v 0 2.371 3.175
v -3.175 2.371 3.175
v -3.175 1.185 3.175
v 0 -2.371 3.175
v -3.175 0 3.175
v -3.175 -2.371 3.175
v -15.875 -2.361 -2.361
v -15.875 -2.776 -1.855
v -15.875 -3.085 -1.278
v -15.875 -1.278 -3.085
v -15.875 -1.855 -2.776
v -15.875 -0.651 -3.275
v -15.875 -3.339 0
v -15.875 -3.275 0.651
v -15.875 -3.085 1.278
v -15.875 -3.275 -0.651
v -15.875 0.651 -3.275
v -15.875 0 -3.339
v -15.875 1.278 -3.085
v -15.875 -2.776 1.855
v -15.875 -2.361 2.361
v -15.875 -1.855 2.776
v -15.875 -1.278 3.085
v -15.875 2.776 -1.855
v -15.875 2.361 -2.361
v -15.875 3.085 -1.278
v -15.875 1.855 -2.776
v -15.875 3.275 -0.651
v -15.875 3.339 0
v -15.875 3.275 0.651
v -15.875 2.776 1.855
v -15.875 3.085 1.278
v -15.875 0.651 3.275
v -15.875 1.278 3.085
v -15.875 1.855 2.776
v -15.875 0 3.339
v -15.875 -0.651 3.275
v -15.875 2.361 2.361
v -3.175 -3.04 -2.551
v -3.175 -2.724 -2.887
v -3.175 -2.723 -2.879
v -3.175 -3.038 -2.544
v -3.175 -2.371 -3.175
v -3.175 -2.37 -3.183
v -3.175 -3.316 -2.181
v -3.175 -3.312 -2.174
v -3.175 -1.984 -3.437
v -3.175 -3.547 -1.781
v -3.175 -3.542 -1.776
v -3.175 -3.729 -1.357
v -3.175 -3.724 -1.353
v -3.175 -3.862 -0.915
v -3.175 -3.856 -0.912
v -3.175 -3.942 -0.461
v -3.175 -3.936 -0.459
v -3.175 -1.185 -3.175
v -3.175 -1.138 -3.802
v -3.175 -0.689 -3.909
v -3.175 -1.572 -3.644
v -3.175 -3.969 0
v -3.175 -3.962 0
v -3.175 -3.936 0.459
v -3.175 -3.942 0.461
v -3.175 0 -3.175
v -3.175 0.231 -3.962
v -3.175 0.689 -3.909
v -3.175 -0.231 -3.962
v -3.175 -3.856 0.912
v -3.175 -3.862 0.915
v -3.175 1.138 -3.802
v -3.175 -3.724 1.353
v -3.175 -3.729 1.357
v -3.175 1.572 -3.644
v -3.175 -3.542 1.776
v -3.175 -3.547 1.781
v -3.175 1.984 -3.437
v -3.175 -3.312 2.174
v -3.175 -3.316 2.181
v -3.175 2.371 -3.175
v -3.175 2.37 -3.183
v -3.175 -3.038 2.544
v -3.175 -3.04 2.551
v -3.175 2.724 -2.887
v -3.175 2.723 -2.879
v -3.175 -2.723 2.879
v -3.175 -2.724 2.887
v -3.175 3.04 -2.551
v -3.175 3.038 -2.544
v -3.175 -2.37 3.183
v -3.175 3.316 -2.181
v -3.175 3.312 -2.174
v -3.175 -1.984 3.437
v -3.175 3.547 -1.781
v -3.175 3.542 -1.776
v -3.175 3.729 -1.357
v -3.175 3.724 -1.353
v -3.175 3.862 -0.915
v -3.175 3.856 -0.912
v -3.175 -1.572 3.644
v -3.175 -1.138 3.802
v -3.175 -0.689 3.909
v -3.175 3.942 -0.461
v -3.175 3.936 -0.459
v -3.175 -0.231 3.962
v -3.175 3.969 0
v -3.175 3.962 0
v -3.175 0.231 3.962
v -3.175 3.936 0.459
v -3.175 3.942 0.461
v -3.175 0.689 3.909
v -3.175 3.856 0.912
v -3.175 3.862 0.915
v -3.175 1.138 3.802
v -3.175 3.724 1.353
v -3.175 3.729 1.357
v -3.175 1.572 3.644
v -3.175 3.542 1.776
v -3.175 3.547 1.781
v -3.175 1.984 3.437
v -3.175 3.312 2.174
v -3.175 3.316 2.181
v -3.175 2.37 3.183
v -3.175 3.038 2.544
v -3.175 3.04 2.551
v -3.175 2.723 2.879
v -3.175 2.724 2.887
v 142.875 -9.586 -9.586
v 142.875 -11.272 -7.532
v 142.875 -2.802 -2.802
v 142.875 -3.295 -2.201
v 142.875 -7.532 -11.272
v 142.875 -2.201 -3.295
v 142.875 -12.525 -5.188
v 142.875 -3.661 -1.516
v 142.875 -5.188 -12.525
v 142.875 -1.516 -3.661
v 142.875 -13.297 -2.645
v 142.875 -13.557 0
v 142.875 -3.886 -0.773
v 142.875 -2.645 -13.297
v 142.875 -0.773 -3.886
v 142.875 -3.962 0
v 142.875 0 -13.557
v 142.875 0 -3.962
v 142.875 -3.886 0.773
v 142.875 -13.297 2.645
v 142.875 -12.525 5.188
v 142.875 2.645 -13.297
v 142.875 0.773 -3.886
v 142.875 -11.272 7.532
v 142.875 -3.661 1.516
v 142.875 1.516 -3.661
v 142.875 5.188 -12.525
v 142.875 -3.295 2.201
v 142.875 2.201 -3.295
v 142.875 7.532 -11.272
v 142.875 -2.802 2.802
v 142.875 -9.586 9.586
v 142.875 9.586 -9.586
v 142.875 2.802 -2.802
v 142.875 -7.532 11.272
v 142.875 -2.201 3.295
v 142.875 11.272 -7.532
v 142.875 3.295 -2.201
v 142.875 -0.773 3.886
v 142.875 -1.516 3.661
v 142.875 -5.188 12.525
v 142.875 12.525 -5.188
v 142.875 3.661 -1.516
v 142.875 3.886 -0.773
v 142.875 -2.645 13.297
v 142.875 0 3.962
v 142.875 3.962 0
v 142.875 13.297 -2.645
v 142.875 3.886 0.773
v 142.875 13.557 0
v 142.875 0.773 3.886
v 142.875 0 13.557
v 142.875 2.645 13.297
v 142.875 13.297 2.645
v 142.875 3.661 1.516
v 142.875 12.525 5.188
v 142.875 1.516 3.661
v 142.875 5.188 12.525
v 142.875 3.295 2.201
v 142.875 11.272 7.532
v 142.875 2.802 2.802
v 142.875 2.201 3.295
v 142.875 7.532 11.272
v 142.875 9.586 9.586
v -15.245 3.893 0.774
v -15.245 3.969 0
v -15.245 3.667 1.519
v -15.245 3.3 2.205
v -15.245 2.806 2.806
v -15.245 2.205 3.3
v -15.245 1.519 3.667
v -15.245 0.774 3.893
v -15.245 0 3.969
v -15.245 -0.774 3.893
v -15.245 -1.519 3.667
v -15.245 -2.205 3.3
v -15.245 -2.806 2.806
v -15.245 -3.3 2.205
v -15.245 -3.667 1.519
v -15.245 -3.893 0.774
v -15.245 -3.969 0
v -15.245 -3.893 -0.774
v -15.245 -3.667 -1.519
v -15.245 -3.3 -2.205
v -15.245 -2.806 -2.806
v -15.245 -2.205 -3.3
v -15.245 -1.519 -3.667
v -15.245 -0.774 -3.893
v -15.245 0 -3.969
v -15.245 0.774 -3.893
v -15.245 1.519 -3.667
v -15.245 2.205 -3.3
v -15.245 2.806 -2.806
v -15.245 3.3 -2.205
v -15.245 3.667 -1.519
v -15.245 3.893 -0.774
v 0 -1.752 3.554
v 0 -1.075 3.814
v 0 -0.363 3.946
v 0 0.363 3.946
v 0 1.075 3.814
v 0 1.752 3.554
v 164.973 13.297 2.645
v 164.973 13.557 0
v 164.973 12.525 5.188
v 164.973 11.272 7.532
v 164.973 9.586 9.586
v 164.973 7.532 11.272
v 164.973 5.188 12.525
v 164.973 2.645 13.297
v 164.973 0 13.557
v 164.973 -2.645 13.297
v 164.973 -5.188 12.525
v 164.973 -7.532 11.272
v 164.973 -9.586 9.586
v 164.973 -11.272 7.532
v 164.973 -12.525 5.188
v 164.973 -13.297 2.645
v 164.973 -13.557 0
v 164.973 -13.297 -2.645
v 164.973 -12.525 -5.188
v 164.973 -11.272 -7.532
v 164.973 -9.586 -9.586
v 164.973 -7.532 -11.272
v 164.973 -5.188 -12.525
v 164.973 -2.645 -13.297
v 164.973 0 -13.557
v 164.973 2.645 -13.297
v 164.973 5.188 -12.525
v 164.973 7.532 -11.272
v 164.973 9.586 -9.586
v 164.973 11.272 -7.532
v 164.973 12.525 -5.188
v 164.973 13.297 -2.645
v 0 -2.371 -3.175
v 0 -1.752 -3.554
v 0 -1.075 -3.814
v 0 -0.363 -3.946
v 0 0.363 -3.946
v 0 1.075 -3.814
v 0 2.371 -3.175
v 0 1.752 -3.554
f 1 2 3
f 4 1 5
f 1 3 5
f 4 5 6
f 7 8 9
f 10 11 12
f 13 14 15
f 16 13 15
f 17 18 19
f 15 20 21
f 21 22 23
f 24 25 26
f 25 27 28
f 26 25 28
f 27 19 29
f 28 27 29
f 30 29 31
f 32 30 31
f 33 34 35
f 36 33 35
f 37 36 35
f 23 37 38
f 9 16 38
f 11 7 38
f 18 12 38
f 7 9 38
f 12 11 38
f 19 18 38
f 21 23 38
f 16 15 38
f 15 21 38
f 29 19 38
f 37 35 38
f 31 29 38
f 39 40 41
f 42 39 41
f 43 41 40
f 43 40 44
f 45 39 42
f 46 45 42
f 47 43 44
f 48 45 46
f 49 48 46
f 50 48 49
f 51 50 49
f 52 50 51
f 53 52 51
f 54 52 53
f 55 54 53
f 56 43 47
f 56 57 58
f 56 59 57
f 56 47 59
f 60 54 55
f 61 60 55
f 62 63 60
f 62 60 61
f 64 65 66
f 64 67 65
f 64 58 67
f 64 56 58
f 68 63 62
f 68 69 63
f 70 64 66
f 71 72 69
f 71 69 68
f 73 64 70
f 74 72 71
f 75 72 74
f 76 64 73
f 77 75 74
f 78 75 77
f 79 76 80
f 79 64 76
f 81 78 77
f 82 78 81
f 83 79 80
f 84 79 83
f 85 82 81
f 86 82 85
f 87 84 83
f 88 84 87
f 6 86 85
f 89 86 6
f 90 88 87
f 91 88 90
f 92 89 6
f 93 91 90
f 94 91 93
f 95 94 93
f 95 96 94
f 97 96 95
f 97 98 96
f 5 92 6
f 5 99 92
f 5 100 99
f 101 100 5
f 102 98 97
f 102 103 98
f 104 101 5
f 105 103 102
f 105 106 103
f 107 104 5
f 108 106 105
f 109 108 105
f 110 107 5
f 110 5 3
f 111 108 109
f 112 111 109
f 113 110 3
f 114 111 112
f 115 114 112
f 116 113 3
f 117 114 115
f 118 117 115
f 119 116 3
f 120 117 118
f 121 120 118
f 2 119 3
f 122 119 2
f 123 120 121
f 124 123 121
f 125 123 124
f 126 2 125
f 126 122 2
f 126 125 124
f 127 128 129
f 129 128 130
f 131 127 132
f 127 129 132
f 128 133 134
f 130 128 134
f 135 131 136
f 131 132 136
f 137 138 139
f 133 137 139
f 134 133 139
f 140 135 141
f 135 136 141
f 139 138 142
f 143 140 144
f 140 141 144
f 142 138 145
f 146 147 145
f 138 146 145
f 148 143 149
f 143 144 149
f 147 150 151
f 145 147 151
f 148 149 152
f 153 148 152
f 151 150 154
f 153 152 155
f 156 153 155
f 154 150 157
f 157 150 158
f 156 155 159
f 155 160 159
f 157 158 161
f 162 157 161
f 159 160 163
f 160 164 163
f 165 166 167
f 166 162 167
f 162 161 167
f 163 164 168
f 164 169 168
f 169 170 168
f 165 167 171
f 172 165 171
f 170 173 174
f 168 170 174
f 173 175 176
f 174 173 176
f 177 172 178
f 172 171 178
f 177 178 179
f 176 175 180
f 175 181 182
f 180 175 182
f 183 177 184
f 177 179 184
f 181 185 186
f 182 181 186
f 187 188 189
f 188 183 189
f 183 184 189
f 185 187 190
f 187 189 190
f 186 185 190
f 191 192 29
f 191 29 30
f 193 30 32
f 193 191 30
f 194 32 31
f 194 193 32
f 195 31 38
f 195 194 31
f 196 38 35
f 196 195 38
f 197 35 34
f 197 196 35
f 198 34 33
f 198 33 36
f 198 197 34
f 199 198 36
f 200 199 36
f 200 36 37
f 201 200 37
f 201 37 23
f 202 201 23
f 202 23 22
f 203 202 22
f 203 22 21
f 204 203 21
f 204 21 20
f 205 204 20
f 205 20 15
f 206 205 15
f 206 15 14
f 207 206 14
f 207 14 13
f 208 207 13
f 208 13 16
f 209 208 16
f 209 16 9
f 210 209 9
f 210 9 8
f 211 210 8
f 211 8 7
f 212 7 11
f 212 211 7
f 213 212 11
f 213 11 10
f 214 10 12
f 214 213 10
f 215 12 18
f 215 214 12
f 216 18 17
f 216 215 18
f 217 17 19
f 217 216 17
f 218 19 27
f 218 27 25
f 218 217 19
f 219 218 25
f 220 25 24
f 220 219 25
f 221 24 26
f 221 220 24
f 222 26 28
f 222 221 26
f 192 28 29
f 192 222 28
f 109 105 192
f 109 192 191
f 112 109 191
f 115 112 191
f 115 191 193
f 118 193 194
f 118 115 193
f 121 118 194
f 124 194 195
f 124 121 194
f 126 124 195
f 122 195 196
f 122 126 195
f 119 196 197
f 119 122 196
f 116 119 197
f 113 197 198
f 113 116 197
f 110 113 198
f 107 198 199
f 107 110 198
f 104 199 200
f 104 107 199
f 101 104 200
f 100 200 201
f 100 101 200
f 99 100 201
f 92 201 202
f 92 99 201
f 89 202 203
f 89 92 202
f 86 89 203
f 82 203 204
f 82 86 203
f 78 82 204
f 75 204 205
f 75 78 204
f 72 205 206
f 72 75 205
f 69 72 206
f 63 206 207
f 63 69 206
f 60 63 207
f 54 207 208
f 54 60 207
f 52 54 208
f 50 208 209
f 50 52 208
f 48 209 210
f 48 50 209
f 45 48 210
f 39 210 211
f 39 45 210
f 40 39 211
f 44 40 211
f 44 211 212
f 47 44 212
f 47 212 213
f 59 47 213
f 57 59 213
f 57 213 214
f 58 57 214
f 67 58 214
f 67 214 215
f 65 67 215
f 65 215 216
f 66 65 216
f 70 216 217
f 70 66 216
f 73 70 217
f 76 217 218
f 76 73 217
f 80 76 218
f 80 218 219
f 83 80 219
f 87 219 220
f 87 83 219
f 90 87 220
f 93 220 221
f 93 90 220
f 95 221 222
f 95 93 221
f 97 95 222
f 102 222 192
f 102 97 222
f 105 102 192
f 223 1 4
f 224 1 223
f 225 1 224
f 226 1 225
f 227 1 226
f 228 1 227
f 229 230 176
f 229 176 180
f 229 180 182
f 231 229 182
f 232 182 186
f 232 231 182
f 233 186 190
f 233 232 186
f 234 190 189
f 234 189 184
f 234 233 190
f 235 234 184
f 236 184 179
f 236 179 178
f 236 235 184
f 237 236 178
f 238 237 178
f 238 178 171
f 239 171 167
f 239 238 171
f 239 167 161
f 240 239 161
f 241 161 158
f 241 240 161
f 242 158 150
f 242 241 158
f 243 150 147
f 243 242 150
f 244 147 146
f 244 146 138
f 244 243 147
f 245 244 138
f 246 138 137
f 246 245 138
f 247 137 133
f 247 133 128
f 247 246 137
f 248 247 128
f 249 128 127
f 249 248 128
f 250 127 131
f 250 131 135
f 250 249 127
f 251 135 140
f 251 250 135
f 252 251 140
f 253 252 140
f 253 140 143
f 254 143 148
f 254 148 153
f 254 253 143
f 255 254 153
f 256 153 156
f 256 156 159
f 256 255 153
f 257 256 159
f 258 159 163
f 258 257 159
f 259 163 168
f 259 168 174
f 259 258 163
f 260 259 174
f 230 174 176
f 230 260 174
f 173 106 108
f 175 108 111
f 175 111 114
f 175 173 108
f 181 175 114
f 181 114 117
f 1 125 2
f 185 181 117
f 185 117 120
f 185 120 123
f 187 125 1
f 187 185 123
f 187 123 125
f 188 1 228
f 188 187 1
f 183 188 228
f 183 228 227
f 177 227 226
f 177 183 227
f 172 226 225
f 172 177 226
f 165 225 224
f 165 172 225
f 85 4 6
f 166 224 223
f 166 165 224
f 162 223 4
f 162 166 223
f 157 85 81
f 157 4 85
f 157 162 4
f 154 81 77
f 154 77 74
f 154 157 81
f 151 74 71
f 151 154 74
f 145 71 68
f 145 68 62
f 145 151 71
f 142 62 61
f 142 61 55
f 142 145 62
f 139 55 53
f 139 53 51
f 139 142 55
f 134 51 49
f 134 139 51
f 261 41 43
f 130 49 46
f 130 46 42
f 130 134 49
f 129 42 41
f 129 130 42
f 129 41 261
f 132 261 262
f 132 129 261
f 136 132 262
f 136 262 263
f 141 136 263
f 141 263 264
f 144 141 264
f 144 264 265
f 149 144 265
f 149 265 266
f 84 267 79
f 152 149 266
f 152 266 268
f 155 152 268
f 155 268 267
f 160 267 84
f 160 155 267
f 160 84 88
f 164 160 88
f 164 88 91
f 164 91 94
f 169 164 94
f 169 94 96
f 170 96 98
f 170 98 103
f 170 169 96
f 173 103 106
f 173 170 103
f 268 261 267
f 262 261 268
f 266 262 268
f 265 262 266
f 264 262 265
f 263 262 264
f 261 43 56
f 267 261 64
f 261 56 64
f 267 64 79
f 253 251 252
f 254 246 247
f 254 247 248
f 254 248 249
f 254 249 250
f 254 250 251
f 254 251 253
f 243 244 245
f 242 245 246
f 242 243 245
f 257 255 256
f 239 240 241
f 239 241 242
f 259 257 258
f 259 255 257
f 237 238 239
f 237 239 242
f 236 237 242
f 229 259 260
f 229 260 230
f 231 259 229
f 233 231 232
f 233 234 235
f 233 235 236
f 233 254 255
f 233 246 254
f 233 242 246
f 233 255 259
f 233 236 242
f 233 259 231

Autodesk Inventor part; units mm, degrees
sketch "Sketch_1" plane through (0, 0, 0) normal (0, 0, 1) x (1, 0, 0)
  line L0 (164.973, 0) -> (-3.175, 0)
  line L1 (-3.175, 0) -> (-3.175, 3.9624)
  line L2 (-3.175, 3.9624) -> (142.875, 3.9624)
  line L3 (142.875, 3.9624) -> (142.875, 13.5572)
  line L4 (142.875, 13.5572) -> (164.973, 13.5572)
  line L5 (164.973, 13.5572) -> (164.973, 0)
  line L6 (164.973, 0) -> (-3.175, 0)
revolve "Revolution1" add sketch "Sketch_1" angle 360 about axis through (164.973, 0, 0) along (1, 0, 0)
sketch "Sketch_3" plane through (0, 0, 0) normal (0, 0, 1) x (1, 0, 0)
  line L0 (-3.175, 0) -> (-15.875, 0)
  line L1 (-15.875, 0) -> (-15.875, 3.3388)
  line L2 (-15.875, 3.3388) -> (-15.2451, 3.9688)
  line L3 (-15.2451, 3.9688) -> (-3.175, 3.9688)
  line L4 (-3.175, 3.9688) -> (-3.175, 0)
  line L5 (-3.175, 0) -> (-15.875, 0)
revolve "Revolution2" add sketch "Sketch_3" angle 360 about axis through (-3.175, 0, 0) along (1, 0, 0)
thread "Thread1" size "5/16-24 UNF" class "2A" standard "ANSI Unified Screw Threads" full length
sketch "Sketch_10" plane through (-3.175, 0, 0) normal (1, 0, 0) x (0, 0, -1)
  line L0 (-7.9248, -7.9248) -> (7.9248, -7.9248)
  line L1 (7.9248, -7.9248) -> (7.9248, 7.9248)
  line L2 (7.9248, 7.9248) -> (-7.9248, 7.9248)
  line L3 (-7.9248, 7.9248) -> (-7.9248, -7.9248)
  line L4 (-3.175, -3.9624) -> (3.175, -3.9624)
  line L5 (3.175, -3.9624) -> (3.175, 3.9624)
  line L6 (3.175, 3.9624) -> (-3.175, 3.9624)
  line L7 (-3.175, 3.9624) -> (-3.175, -3.9624)
extrude "Extrusion1" cut sketch "Sketch_10" along normal blind 3.175
ref_plane "dia1_XY" through (-3.175, 3.9624, 0) normal (1, 0, 0) x (0, 0, -1)
ref_plane "dia1_YZ" through (-3.175, 3.9624, 0) normal (0, 0, -1) x (0, 1, 0)
ref_plane "dia1_ZX" through (-3.175, 3.9624, 0) normal (0, 1, 0) x (1, 0, 0)
ref_plane "dia12_XY" through (0, 0, 14.1351) normal (1, 0, 0) x (0, 0, -1)
ref_plane "dia12_YZ" through (0, 0, 14.1351) normal (0, 0, -1) x (0, 1, 0)
ref_plane "dia12_ZX" through (0, 0, 14.1351) normal (0, 1, 0) x (1, 0, 0)
ref_plane "dia2_XY" through (-3.175, -3.9624, 0) normal (1, 0, 0) x (0, 0, -1)
ref_plane "dia2_YZ" through (-3.175, -3.9624, 0) normal (0, 0, -1) x (0, 1, 0)
ref_plane "dia2_ZX" through (-3.175, -3.9624, 0) normal (0, 1, 0) x (1, 0, 0)
ref_plane "dia22_XY" through (0, 0, -14.1351) normal (1, 0, 0) x (0, 0, -1)
ref_plane "dia22_YZ" through (0, 0, -14.1351) normal (0, 0, -1) x (0, 1, 0)
ref_plane "dia22_ZX" through (0, 0, -14.1351) normal (0, 1, 0) x (1, 0, 0)
ref_plane "rl1_XY" through (-15.875, 0, 0) normal (1, 0, 0) x (0, 0, -1)
ref_plane "rl1_YZ" through (-15.875, 0, 0) normal (0, 0, -1) x (0, 1, 0)
ref_plane "rl1_ZX" through (-15.875, 0, 0) normal (0, 1, 0) x (1, 0, 0)
ref_plane "rl2_XY" through (-3.175, 0, 0) normal (1, 0, 0) x (0, 0, -1)
ref_plane "rl2_YZ" through (-3.175, 0, 0) normal (0, 0, -1) x (0, 1, 0)
ref_plane "rl2_ZX" through (-3.175, 0, 0) normal (0, 1, 0) x (1, 0, 0)
ref_plane "rod_cp_XY" through (0, 0, 0) normal (1, 0, 0) x (0, 0, -1)
ref_plane "rod_cp_YZ" through (0, 0, 0) normal (0, 0, -1) x (0, 1, 0)
ref_plane "rod_cp_ZX" through (0, 0, 0) normal (0, 1, 0) x (1, 0, 0)
ref_plane "thd1_XY" through (-15.875, 3.9688, 0) normal (1, 0, 0) x (0, 0, -1)
ref_plane "thd1_YZ" through (-15.875, 3.9688, 0) normal (0, 0, -1) x (0, 1, 0)
ref_plane "thd1_ZX" through (-15.875, 3.9688, 0) normal (0, 1, 0) x (1, 0, 0)
ref_plane "thd2_XY" through (-15.875, -3.9688, 0) normal (1, 0, 0) x (0, 0, -1)
ref_plane "thd2_YZ" through (-15.875, -3.9688, 0) normal (0, 0, -1) x (0, 1, 0)
ref_plane "thd2_ZX" through (-15.875, -3.9688, 0) normal (0, 1, 0) x (1, 0, 0)
ref_plane "to_rod_clevis_XY" through (-20.701, 0, 0) normal (1, 0, 0) x (0, 0, -1)
ref_plane "to_rod_clevis_YZ" through (-20.701, 0, 0) normal (0, 0, -1) x (0, 1, 0)
ref_plane "to_rod_clevis_ZX" through (-20.701, 0, 0) normal (0, 1, 0) x (1, 0, 0)
ref_plane "wf1_XY" through (-3.175, 0, 0) normal (1, 0, 0) x (0, 0, -1)
ref_plane "wf1_YZ" through (-3.175, 0, 0) normal (0, 0, -1) x (0, 1, 0)
ref_plane "wf1_ZX" through (-3.175, 0, 0) normal (0, 1, 0) x (1, 0, 0)
ref_plane "wf2_XY" through (0, 0, 0) normal (1, 0, 0) x (0, 0, -1)
ref_plane "wf2_YZ" through (0, 0, 0) normal (0, 0, -1) x (0, 1, 0)
ref_plane "wf2_ZX" through (0, 0, 0) normal (0, 1, 0) x (1, 0, 0)
ref_plane "wfw1_XY" through (-3.175, 0, -3.175) normal (0, 1, 0) x (1, 0, 0)
ref_plane "wfw1_YZ" through (-3.175, 0, -3.175) normal (1, 0, 0) x (0, 0, -1)
ref_plane "wfw1_ZX" through (-3.175, 0, -3.175) normal (0, 0, -1) x (0, 1, 0)
ref_plane "wfw2_XY" through (-3.175, 0, 3.175) normal (0, 1, 0) x (1, 0, 0)
ref_plane "wfw2_YZ" through (-3.175, 0, 3.175) normal (1, 0, 0) x (0, 0, -1)
ref_plane "wfw2_ZX" through (-3.175, 0, 3.175) normal (0, 0, -1) x (0, 1, 0)
properties part number "SR-094-D0_rod"
